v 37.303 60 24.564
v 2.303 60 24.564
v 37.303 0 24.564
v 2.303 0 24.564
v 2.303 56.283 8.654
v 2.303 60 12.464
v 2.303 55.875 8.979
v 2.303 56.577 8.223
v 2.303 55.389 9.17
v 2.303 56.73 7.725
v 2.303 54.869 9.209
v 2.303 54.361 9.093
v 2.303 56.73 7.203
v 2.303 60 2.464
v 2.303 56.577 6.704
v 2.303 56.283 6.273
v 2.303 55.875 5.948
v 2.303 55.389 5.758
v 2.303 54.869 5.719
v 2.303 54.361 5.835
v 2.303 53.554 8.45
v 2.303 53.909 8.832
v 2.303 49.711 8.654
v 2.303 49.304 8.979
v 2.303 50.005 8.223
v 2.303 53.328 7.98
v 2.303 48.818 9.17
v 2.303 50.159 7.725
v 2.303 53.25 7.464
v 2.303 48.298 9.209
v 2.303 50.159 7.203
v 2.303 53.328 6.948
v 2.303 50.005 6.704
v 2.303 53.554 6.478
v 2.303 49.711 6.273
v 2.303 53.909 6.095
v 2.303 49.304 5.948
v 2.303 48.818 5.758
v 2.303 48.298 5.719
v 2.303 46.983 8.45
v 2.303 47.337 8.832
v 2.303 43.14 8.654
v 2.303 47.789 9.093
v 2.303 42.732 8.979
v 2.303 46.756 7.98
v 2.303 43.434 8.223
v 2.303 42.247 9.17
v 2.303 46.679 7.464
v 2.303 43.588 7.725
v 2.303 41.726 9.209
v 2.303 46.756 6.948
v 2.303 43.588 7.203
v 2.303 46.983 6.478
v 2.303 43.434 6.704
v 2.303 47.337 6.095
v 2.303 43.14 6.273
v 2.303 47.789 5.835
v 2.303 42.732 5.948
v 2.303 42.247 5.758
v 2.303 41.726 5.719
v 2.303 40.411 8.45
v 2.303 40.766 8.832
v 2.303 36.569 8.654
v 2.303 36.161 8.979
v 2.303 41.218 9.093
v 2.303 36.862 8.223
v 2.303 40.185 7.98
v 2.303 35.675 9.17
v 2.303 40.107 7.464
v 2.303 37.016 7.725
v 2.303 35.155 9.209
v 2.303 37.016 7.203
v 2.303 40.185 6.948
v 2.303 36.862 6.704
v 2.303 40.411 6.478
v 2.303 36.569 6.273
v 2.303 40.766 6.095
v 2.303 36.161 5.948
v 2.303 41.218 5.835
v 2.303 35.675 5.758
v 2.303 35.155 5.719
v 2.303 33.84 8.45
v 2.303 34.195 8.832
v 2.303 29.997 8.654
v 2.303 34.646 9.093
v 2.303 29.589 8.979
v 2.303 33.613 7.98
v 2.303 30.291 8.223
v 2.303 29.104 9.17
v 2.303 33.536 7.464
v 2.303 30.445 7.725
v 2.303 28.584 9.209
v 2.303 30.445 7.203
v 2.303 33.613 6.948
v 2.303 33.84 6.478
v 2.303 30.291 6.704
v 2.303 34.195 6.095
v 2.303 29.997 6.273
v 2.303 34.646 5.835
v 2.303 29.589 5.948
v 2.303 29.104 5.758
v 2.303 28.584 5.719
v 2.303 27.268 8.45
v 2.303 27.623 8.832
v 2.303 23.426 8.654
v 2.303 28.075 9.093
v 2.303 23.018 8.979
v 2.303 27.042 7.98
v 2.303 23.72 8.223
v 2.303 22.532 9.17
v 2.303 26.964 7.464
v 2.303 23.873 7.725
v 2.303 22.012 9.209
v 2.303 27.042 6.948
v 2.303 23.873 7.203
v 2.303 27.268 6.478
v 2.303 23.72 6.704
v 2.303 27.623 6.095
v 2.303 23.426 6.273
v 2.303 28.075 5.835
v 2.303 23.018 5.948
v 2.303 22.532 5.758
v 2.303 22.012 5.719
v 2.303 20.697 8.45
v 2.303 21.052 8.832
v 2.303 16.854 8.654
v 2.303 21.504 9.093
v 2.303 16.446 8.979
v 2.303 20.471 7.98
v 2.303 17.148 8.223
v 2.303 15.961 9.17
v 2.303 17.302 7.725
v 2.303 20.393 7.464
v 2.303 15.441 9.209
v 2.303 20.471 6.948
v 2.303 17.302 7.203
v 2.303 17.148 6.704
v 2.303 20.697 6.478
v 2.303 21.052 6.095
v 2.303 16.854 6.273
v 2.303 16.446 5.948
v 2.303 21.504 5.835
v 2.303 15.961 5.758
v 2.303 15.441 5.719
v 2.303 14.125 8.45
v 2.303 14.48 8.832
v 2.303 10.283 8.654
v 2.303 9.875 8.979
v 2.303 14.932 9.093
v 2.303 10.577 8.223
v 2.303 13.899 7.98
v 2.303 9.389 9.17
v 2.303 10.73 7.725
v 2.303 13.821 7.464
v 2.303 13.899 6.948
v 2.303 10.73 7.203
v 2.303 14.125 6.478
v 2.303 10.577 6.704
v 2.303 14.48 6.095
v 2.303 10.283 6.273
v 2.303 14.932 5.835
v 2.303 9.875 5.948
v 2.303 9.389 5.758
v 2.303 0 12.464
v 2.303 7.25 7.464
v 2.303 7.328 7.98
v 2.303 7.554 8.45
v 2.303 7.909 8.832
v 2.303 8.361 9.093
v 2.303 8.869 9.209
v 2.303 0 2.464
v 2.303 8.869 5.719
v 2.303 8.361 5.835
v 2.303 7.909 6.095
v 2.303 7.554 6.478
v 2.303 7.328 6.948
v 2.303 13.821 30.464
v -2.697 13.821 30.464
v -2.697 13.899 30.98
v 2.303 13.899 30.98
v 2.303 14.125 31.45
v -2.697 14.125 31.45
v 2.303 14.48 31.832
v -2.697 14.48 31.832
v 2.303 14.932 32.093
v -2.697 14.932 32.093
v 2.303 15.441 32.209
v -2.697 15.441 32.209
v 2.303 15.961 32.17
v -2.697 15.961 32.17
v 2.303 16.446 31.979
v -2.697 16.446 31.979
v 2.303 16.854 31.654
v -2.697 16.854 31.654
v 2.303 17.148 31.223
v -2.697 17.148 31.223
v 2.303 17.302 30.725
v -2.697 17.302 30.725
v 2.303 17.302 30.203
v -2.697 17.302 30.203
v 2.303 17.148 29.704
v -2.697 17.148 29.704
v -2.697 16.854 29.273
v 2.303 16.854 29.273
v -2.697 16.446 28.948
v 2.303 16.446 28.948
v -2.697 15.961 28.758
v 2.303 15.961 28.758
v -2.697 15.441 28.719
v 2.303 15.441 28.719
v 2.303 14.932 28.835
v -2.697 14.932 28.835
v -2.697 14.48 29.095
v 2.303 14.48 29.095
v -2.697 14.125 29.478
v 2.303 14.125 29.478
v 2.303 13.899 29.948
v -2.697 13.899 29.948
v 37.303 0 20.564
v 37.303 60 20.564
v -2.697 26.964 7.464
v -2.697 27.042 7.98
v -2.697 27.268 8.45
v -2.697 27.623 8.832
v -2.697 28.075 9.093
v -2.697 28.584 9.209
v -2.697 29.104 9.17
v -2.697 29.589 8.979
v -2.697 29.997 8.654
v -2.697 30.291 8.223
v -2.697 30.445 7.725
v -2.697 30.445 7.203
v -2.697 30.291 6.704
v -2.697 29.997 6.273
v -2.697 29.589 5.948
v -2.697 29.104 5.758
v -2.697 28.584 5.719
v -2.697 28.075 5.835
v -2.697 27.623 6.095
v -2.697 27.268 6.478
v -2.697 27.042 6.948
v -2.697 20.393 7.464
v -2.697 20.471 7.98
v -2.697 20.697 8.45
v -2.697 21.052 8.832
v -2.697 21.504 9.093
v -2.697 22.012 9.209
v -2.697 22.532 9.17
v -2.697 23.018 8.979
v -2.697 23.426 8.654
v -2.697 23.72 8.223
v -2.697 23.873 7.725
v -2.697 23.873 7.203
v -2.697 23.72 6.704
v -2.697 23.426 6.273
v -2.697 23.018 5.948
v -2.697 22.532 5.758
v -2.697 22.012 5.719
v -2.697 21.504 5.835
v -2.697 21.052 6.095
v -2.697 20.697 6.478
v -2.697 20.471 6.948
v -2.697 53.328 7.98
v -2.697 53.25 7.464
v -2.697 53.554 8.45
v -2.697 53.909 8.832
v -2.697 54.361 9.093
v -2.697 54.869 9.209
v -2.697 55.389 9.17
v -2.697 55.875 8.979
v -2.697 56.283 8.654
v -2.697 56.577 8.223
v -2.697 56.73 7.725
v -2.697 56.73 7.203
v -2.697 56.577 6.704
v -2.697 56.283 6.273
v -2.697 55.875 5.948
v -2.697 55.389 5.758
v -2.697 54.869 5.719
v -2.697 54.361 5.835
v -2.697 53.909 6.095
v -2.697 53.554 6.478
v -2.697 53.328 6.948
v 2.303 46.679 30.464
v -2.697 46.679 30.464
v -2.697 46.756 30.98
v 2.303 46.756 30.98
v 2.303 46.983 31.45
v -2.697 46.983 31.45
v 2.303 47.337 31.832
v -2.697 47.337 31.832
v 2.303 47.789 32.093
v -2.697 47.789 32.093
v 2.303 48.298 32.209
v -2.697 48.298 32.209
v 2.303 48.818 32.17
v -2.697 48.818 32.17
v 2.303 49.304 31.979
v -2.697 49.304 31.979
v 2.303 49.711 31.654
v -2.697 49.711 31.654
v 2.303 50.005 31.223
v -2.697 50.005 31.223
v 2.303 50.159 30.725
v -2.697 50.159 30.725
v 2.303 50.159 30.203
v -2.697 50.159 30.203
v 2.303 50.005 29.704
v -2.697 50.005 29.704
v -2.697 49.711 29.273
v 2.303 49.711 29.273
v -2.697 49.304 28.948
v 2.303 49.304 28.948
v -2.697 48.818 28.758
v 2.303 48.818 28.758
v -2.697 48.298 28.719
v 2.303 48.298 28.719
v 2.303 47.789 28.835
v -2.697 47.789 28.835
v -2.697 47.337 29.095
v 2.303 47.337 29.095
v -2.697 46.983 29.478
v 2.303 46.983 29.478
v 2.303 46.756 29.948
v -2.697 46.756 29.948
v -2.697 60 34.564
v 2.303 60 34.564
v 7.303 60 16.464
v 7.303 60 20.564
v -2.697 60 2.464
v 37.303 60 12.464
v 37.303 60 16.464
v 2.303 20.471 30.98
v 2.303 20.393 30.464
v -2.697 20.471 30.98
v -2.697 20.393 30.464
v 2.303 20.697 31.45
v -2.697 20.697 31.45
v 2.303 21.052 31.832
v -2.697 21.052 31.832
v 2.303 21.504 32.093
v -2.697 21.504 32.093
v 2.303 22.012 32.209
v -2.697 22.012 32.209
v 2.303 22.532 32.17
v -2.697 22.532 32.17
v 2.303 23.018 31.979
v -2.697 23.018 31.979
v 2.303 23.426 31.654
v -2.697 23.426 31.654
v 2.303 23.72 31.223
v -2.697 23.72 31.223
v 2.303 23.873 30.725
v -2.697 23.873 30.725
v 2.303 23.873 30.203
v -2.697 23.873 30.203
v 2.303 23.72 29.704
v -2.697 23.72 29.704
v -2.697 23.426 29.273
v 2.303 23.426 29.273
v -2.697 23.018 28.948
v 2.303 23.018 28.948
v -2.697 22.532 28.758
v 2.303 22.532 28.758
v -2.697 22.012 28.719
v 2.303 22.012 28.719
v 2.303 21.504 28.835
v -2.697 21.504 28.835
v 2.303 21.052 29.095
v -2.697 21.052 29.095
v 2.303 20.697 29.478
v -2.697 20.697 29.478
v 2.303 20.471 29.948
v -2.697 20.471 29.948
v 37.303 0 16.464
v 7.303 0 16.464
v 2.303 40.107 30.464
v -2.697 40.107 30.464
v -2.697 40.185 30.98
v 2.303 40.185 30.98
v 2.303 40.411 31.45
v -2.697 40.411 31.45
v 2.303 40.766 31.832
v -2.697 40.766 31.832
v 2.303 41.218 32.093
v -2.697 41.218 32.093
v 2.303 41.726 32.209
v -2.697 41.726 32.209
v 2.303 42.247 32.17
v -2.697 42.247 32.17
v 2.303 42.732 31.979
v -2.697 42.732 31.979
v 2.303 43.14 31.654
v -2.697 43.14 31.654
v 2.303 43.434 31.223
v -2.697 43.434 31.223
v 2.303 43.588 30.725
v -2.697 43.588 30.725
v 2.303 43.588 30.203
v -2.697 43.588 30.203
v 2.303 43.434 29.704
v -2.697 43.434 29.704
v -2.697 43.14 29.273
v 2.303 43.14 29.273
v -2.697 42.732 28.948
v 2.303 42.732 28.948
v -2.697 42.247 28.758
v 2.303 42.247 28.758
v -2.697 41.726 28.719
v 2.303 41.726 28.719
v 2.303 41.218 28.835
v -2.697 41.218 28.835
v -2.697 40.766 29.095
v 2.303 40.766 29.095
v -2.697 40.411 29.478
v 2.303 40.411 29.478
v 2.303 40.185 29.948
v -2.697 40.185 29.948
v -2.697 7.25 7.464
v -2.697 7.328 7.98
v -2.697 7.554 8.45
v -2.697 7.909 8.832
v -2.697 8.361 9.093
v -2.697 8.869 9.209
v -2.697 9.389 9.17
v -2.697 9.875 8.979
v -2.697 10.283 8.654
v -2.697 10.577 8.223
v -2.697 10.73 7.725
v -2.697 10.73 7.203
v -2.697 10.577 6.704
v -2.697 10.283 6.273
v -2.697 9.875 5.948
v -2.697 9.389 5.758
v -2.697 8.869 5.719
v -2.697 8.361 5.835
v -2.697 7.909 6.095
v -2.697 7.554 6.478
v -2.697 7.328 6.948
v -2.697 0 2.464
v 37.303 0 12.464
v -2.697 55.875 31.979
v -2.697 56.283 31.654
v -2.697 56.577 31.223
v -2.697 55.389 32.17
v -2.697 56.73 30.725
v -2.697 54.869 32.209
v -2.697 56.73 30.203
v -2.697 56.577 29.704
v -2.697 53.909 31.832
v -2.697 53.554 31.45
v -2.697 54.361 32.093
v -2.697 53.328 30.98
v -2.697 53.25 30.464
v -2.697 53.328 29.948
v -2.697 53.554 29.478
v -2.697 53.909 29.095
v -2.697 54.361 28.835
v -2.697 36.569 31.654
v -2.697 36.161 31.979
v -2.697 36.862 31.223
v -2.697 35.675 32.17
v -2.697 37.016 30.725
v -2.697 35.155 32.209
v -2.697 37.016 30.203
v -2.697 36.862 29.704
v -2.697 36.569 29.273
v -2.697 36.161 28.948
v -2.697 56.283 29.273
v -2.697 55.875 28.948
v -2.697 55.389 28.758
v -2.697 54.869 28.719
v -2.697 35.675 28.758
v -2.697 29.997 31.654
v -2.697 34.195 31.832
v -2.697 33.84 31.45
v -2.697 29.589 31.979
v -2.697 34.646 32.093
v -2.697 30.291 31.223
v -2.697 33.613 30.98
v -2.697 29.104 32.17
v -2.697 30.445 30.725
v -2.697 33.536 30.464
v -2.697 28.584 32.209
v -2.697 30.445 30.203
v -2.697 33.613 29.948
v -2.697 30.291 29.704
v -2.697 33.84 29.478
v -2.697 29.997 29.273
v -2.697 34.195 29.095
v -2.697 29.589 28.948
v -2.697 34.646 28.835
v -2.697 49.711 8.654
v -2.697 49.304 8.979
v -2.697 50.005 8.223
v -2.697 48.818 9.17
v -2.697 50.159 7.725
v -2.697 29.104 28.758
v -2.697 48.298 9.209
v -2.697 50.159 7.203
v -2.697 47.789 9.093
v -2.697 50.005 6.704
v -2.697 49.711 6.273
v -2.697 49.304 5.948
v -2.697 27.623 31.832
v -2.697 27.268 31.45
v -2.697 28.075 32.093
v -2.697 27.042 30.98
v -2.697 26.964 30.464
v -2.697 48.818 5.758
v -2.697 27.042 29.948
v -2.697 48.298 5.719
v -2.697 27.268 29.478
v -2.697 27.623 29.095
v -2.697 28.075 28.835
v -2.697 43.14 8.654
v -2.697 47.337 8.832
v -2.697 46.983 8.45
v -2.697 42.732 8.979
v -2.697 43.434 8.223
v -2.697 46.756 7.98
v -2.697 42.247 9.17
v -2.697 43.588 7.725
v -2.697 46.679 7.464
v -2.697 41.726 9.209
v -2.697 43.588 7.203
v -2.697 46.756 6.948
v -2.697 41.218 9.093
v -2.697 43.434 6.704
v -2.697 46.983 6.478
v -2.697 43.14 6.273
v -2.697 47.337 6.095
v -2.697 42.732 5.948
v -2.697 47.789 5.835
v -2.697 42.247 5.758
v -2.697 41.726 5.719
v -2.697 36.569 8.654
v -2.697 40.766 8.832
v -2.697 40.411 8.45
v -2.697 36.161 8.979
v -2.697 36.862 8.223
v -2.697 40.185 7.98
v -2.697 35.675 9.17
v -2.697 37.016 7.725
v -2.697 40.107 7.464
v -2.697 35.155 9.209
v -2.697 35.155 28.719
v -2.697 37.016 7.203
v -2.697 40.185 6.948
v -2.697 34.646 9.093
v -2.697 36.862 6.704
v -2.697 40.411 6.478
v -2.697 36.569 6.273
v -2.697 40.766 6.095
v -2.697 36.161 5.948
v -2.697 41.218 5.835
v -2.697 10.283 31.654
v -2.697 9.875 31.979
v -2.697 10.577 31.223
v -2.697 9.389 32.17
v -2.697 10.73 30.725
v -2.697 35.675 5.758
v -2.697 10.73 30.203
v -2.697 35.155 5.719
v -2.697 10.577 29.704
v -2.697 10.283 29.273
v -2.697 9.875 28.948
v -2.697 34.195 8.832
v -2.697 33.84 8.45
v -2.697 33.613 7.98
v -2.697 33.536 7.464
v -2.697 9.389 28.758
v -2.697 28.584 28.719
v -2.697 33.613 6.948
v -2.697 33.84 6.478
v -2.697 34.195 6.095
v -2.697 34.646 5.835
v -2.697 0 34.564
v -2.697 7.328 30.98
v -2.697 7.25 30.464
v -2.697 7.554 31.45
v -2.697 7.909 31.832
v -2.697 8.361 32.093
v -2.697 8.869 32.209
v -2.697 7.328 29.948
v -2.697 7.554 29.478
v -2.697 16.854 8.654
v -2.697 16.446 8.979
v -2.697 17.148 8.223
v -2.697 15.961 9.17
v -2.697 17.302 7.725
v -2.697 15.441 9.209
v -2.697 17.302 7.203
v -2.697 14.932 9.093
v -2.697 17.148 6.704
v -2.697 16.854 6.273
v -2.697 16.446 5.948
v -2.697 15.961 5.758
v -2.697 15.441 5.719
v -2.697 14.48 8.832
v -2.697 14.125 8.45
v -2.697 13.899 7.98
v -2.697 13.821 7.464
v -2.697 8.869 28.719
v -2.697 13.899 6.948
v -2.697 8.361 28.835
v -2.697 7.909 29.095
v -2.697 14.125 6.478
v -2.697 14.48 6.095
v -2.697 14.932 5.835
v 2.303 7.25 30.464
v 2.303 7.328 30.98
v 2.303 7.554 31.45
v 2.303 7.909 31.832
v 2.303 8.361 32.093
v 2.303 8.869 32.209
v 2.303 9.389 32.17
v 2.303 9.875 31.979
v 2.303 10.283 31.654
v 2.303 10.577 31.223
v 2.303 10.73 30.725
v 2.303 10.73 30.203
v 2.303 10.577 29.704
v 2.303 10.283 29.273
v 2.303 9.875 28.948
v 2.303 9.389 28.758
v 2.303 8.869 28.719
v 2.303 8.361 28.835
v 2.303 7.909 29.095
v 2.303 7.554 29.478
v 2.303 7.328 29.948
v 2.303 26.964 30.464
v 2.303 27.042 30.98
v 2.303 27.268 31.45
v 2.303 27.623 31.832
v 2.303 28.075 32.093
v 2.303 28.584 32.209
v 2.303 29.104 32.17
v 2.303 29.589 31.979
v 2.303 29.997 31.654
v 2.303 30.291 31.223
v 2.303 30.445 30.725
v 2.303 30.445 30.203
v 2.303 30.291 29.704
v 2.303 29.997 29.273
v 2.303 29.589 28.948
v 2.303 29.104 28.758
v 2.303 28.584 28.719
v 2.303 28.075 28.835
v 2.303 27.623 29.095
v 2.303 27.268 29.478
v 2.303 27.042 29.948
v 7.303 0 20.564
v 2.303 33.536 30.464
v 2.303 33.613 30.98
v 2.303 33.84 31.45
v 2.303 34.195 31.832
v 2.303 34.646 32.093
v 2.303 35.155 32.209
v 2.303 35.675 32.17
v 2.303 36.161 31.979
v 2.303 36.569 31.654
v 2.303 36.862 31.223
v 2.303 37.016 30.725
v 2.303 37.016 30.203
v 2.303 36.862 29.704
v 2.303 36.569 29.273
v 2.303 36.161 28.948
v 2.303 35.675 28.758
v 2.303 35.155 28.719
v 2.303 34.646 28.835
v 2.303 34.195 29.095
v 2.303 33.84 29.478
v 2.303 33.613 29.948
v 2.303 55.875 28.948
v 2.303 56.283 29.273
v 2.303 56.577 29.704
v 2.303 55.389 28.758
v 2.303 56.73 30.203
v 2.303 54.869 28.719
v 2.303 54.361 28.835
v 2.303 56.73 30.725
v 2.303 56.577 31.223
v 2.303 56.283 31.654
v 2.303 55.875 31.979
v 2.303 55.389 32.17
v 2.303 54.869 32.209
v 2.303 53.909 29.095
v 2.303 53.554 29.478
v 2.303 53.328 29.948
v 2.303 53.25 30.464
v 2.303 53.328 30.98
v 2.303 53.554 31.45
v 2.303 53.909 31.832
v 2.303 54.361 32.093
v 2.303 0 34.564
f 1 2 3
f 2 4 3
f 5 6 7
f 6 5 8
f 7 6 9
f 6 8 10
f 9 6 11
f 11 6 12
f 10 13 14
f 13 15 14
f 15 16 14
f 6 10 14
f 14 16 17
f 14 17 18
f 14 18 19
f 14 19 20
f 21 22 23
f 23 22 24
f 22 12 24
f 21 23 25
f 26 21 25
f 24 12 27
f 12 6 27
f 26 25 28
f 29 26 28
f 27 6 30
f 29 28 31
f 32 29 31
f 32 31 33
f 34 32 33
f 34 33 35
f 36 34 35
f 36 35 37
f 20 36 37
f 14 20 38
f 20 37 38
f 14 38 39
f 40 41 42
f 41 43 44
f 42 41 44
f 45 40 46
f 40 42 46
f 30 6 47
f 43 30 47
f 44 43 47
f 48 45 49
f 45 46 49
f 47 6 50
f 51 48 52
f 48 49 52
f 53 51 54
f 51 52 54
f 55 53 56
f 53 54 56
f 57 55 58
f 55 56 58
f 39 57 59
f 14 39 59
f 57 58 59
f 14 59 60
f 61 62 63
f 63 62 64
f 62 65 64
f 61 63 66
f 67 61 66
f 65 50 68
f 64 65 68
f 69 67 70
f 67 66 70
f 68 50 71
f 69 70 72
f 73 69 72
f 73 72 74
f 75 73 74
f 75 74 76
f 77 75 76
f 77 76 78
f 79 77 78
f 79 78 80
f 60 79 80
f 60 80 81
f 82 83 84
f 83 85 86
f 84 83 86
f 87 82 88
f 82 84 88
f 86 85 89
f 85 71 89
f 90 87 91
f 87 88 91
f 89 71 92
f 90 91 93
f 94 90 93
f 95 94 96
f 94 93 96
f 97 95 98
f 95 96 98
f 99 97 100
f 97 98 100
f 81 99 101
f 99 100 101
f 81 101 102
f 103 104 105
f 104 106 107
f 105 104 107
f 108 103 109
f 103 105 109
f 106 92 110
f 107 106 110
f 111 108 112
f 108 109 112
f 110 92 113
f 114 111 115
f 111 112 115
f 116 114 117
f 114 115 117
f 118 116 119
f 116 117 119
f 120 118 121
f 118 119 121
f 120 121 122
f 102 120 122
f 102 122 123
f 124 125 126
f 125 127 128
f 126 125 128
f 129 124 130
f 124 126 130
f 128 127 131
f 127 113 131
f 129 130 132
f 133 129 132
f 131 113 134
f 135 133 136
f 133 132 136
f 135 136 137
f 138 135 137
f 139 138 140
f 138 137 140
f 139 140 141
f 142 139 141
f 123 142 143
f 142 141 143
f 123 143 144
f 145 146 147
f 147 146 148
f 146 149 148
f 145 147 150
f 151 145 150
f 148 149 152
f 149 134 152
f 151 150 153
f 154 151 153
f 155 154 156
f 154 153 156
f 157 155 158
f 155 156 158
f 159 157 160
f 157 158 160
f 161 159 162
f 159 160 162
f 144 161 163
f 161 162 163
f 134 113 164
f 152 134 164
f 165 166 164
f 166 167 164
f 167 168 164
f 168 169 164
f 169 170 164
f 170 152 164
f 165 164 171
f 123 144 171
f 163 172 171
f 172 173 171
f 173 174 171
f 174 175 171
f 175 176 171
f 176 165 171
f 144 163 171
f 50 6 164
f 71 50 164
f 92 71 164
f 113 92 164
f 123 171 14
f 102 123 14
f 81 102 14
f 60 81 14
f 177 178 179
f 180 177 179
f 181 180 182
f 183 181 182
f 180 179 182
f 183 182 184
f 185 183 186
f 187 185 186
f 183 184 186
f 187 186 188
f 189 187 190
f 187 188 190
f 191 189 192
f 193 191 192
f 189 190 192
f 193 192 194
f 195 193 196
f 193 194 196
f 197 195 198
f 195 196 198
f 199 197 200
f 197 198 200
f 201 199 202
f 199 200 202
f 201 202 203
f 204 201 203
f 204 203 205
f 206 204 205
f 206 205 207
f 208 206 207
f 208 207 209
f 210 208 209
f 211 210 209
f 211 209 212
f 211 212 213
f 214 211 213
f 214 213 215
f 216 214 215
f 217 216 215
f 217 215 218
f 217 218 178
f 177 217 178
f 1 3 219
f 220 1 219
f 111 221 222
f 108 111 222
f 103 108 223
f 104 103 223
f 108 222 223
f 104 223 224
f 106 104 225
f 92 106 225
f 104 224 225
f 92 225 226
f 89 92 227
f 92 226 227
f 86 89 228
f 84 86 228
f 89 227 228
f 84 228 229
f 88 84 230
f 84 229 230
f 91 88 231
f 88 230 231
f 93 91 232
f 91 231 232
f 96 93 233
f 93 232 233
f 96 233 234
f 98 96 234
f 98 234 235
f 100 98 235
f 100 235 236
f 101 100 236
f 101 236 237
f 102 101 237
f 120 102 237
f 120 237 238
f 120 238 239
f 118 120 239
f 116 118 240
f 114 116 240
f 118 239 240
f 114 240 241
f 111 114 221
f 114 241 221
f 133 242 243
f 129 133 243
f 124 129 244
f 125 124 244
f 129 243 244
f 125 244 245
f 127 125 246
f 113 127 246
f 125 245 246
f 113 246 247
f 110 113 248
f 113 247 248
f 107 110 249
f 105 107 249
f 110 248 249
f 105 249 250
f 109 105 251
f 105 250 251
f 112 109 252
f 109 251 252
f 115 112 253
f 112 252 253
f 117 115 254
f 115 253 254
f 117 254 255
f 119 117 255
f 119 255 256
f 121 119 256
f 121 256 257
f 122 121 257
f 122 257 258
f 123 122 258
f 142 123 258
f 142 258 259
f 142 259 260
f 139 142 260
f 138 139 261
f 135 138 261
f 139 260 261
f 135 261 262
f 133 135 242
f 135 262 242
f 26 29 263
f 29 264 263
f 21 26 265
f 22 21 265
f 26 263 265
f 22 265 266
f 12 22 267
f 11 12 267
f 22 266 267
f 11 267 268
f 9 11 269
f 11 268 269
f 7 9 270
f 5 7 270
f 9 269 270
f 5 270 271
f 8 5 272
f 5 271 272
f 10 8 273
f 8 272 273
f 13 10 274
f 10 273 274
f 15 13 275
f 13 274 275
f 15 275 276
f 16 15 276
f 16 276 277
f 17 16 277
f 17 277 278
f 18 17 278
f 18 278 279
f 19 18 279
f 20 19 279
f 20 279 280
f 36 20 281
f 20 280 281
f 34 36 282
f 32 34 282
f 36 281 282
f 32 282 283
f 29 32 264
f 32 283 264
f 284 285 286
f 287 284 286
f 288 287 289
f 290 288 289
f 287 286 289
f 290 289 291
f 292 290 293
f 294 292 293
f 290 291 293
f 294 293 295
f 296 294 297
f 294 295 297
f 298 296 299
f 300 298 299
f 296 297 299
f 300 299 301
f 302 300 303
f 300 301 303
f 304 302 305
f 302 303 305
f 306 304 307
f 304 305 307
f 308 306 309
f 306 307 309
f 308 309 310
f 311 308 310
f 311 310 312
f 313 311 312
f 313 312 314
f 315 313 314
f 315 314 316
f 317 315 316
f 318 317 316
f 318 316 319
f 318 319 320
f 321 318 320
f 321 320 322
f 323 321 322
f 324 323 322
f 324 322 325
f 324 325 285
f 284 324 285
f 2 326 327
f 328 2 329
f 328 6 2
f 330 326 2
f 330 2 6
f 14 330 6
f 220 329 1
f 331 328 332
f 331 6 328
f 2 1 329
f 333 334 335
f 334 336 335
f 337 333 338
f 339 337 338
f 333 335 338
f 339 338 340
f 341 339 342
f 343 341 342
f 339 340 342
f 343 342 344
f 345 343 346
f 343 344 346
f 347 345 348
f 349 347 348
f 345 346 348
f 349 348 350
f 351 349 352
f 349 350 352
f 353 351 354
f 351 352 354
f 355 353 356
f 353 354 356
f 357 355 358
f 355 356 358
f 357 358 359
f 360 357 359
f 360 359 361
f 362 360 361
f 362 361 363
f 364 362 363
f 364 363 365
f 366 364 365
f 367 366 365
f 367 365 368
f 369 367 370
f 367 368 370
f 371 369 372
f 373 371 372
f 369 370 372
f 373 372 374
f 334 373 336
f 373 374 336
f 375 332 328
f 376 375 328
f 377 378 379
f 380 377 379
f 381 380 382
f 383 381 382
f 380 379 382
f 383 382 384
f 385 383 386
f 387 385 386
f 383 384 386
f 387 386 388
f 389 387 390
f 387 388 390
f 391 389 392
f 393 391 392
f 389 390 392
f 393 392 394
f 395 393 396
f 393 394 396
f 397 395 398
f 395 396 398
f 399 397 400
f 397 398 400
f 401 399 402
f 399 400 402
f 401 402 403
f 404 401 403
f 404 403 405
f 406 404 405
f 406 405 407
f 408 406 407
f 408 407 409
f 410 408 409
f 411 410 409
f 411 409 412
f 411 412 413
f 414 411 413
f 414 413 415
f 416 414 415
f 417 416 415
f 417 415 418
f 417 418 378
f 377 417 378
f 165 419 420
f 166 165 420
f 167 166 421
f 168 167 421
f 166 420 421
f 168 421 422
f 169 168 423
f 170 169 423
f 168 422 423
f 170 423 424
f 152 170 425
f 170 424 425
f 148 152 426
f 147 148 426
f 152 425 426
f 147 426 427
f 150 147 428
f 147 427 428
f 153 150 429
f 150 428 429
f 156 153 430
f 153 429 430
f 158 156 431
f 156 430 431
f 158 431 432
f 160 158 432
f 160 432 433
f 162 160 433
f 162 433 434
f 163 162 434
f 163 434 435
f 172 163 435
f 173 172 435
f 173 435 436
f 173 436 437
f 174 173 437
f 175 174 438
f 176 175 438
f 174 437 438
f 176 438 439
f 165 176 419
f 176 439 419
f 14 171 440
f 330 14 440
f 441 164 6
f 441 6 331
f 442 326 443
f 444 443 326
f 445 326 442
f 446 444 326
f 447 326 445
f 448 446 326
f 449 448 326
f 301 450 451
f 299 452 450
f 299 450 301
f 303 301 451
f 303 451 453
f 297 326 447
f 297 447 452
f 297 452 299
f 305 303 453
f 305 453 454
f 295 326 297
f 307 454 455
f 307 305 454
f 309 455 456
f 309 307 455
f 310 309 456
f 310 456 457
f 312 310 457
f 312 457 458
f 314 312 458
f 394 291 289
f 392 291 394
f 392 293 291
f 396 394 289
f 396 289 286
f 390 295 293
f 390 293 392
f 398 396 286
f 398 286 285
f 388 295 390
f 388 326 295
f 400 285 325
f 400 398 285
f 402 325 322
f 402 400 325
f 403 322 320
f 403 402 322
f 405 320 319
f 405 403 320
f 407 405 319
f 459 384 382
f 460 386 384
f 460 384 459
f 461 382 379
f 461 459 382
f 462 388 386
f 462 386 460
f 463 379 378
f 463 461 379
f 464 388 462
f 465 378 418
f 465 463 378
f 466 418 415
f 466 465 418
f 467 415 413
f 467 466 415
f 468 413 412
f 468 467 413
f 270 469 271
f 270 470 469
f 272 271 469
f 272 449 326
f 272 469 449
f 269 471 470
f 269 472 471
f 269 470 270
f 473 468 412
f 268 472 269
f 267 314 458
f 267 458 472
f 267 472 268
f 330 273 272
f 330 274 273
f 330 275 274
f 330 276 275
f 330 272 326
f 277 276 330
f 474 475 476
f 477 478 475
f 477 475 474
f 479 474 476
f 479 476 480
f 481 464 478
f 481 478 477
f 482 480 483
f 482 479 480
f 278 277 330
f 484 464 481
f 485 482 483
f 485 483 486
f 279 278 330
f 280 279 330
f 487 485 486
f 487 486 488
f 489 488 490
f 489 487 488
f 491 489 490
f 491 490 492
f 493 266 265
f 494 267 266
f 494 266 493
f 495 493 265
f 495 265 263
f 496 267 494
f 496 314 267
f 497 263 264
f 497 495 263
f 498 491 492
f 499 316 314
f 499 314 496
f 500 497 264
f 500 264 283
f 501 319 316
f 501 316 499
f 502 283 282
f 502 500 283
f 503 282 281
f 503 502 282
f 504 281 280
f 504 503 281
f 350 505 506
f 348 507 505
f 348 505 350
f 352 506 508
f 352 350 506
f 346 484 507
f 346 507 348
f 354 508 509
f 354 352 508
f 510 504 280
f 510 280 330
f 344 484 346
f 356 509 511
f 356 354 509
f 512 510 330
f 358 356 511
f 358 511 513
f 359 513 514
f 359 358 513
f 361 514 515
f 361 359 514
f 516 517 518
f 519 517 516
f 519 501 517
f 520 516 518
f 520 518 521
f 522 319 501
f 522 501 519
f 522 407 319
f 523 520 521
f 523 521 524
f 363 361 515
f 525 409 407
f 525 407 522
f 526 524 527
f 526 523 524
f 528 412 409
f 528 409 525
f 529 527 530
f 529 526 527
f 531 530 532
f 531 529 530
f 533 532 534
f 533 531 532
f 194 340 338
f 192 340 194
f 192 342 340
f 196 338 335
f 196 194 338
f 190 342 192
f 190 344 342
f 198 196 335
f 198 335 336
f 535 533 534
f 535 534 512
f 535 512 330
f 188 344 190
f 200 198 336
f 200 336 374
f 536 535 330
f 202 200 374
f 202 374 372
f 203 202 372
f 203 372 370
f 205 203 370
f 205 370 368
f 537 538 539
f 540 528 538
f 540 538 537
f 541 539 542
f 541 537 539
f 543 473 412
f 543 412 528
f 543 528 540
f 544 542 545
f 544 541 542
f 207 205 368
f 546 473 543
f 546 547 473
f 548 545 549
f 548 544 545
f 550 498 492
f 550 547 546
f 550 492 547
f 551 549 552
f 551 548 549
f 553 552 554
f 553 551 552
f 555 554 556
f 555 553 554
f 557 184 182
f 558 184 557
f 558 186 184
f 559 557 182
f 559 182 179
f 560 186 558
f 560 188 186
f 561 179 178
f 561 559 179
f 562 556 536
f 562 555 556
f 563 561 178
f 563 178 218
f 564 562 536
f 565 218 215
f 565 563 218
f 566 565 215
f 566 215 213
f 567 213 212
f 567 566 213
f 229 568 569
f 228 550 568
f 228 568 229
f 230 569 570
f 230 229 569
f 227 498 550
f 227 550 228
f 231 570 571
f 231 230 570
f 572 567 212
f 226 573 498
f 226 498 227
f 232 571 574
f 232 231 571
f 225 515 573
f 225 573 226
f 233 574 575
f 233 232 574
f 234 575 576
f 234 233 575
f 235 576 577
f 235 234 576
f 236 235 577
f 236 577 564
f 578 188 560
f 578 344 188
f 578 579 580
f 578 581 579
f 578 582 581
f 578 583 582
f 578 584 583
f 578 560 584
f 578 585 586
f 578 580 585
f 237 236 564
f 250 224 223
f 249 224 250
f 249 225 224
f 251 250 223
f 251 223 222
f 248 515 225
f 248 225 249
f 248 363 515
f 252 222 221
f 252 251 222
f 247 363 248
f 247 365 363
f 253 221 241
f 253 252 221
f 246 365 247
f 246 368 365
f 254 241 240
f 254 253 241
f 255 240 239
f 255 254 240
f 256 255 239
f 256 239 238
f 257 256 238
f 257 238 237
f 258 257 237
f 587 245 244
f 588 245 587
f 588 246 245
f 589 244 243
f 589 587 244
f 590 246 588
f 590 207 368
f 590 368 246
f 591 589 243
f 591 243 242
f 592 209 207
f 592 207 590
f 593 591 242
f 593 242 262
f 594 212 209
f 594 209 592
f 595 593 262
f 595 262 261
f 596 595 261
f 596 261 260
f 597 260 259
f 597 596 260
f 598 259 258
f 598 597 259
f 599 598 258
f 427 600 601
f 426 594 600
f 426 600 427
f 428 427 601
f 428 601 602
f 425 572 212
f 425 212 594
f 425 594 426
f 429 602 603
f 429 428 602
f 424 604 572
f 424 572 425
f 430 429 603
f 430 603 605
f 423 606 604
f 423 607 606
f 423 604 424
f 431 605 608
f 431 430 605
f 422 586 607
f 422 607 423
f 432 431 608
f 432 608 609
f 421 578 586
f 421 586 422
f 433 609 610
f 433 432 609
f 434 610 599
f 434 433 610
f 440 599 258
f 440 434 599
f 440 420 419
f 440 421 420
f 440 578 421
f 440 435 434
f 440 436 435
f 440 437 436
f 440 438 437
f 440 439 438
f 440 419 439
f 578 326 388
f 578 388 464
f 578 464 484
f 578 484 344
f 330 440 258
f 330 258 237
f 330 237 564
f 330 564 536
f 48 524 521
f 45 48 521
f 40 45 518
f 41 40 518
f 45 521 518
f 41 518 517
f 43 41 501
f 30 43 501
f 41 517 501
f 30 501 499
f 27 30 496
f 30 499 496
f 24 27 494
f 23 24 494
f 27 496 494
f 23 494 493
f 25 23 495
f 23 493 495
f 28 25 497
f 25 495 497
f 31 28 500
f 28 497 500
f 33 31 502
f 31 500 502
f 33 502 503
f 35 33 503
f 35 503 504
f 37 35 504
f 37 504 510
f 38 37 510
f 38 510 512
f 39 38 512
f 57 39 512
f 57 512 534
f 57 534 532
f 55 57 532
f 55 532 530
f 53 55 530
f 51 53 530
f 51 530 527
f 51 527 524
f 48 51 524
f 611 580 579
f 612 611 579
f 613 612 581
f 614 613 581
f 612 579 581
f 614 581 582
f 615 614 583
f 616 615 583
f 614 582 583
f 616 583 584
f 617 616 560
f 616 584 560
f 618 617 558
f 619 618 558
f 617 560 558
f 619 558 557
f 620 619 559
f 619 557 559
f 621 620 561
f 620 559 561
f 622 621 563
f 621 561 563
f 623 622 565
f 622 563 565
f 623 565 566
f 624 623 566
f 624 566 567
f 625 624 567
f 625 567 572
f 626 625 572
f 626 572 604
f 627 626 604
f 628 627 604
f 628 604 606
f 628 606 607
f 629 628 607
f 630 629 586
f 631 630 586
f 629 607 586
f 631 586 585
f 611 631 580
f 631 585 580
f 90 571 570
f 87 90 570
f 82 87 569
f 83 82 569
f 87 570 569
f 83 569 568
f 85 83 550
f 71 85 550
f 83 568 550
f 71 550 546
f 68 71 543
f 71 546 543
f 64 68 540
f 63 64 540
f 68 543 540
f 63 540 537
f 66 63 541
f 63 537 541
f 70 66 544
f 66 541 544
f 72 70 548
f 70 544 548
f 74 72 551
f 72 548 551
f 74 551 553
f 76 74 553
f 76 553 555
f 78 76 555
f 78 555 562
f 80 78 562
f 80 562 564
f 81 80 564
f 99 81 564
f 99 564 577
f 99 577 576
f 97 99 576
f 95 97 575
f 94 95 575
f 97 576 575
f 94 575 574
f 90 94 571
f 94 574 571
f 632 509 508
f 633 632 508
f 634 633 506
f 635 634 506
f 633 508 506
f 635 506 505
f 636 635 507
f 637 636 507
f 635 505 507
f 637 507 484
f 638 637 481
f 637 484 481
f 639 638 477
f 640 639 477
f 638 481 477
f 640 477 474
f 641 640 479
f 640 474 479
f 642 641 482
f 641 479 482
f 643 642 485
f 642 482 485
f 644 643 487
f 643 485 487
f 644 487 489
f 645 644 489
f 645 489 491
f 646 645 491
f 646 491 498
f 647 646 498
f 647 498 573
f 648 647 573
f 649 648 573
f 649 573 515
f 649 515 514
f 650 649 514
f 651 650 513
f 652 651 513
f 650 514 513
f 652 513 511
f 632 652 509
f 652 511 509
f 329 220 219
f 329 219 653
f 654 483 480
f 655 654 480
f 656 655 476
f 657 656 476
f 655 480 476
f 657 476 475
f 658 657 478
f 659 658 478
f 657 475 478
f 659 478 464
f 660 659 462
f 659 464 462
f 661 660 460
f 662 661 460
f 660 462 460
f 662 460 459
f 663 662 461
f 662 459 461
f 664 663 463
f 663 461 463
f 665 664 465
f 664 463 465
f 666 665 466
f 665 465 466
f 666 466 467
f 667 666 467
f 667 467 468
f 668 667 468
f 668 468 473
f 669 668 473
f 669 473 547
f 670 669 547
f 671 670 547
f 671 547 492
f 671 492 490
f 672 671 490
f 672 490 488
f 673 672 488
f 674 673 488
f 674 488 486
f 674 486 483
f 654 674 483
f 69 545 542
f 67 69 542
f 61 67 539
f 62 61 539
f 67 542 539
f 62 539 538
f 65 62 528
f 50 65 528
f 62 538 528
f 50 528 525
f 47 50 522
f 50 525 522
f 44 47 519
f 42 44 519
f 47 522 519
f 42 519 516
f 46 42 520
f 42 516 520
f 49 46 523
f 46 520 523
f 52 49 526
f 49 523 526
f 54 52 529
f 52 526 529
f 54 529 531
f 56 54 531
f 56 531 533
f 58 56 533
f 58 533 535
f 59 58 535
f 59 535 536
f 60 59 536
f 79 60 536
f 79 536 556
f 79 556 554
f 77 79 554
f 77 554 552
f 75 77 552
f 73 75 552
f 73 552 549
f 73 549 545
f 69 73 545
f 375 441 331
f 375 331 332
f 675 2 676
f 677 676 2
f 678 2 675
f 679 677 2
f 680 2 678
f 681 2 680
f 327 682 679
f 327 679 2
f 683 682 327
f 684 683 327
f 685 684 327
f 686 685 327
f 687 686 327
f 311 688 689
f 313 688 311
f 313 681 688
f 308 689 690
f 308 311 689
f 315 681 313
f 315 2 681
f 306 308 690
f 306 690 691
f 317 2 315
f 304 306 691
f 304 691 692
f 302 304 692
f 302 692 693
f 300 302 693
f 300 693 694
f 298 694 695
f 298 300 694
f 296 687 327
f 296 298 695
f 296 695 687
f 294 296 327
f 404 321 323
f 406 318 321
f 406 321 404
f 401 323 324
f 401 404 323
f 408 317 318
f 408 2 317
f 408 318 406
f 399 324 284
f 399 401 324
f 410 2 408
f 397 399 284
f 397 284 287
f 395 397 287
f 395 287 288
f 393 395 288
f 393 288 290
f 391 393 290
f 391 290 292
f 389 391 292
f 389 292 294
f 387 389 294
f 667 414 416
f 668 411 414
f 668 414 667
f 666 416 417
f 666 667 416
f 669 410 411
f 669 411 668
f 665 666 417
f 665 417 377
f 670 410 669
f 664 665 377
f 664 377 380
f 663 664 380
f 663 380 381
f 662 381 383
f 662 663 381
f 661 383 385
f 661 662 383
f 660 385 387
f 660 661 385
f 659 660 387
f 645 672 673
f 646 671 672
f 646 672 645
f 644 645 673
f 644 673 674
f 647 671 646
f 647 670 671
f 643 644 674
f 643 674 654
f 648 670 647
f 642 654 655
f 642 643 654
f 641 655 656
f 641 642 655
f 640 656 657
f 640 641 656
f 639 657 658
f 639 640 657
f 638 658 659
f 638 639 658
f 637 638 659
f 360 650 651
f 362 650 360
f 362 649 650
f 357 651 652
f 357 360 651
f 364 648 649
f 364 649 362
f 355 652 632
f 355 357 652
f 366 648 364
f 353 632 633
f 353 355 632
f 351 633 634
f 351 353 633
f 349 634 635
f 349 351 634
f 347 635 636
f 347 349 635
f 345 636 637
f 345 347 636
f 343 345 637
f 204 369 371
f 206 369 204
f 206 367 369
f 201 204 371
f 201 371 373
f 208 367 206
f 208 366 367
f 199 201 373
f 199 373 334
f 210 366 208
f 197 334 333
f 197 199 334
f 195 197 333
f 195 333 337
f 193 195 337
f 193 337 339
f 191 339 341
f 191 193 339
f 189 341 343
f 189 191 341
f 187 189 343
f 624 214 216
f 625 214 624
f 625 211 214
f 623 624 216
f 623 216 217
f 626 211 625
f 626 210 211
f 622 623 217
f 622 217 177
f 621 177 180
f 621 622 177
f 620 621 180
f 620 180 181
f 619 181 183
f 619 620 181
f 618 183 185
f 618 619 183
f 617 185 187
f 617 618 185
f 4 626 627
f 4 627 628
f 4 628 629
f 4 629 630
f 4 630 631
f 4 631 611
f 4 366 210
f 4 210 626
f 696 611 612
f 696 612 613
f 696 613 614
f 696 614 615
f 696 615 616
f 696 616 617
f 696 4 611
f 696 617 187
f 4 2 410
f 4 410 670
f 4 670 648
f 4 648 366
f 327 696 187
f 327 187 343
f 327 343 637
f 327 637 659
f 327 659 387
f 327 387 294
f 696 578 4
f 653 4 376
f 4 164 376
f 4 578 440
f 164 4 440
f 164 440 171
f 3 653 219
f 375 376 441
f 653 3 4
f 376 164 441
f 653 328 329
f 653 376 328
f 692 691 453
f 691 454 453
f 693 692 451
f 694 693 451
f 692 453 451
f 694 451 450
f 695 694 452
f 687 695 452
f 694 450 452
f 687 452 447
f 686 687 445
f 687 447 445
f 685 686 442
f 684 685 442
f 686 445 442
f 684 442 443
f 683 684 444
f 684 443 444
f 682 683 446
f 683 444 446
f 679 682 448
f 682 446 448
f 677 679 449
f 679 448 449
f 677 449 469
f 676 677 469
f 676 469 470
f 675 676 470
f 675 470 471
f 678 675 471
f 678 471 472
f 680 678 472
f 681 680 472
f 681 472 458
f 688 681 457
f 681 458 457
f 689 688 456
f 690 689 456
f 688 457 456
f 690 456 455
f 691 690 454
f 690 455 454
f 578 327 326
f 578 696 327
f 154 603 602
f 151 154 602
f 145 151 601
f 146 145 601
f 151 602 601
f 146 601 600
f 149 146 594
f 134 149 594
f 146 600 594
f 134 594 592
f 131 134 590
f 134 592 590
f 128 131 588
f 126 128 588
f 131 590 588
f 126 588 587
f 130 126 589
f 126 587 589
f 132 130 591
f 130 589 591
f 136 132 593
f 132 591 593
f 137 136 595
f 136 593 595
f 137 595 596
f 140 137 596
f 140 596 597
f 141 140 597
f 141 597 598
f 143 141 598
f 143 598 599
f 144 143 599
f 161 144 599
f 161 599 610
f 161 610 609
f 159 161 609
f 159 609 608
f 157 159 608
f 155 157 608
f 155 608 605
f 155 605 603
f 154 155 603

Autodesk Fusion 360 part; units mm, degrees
sketch "Sketch1" plane through (0, 0, 0) normal (0, 1, 0) x (1, 0, 0)
  line L0 (37.303, -16.4637) -> (7.303, -16.4637)
  line L1 (-2.697, -16.4637) -> (-2.697, -12.4637)
  line L2 (2.303, -12.4637) -> (37.303, -12.4637)
  line L3 (37.303, -12.4637) -> (37.303, -16.4637)
  line L4 (37.303, -18.5137) -> (-5.6588, -18.5137) construction
  line L5 (2.303, -24.5637) -> (37.303, -24.5637)
  line L6 (-2.697, -20.5637) -> (-2.697, -24.5637)
  line L7 (37.303, -20.5637) -> (7.303, -20.5637)
  line L8 (37.303, -24.5637) -> (37.303, -20.5637)
  line L9 (-2.697, -16.4637) -> (-2.697, -20.5637)
  line L10 (7.303, -16.4637) -> (7.303, -20.5637)
  line L11 (2.303, -12.4637) -> (2.303, -2.4637)
  line L12 (2.303, -2.4637) -> (-2.697, -2.4637)
  line L13 (-2.697, -2.4637) -> (-2.697, -12.4637)
  line L14 (-2.697, -34.5637) -> (-2.697, -24.5637)
  line L15 (2.303, -34.5637) -> (-2.697, -34.5637)
  line L16 (2.303, -24.5637) -> (2.303, -34.5637)
  dimension "d4" = 4
  dimension "d5" = 10
  dimension "d6" = 5
  dimension "d7" = 10
extrude "Extrude1" add sketch "Sketch1" along normal blind 60
sketch "Sketch2" plane through (-2.697, 0, 0) normal (-1, 0, 0) x (0, -1, 0)
  line L0 (0, 2.4637) -> (0, 34.5637)
  line L1 (0, 34.5637) -> (-60, 34.5637)
  line L2 (-60, 34.5637) -> (-60, 2.4637)
  line L3 (-60, 2.4637) -> (0, 2.4637)
  circle A0 centre (-55, 7.4637) radius 1.75
  circle A1 centre (-48.4286, 7.4637) radius 1.75
  circle A2 centre (-41.8571, 7.4637) radius 1.75
  circle A3 centre (-35.2857, 7.4637) radius 1.75
  circle A4 centre (-28.7143, 7.4637) radius 1.75
  circle A5 centre (-22.1429, 7.4637) radius 1.75
  circle A6 centre (-15.5714, 7.4637) radius 1.75
  circle A7 centre (-9, 7.4637) radius 1.75
  circle A8 centre (-55, 30.4637) radius 1.75
  circle A9 centre (-48.4286, 30.4637) radius 1.75
  circle A10 centre (-41.8571, 30.4637) radius 1.75
  circle A11 centre (-35.2857, 30.4637) radius 1.75
  circle A12 centre (-28.7143, 30.4637) radius 1.75
  circle A13 centre (-22.1429, 30.4637) radius 1.75
  circle A14 centre (-15.5714, 30.4637) radius 1.75
  circle A15 centre (-9, 30.4637) radius 1.75
  dimension "d10" = 3.5
  dimension "d11" = 5
  dimension "d12" = 5
  dimension "d15" = 46
  dimension "d16" = 0
  dimension "d17" = 3.5
  dimension "d18" = 28
  dimension "d21" = 46
  dimension "d22" = 0
extrude "Extrude2" cut sketch "Sketch2" against normal blind 11 contours A0 | A1 | A2 | A3 | A4 | A5 | A6 | A7 | A8 | A9 | A10 | A11 | A12 | A13 | A14 | A15
